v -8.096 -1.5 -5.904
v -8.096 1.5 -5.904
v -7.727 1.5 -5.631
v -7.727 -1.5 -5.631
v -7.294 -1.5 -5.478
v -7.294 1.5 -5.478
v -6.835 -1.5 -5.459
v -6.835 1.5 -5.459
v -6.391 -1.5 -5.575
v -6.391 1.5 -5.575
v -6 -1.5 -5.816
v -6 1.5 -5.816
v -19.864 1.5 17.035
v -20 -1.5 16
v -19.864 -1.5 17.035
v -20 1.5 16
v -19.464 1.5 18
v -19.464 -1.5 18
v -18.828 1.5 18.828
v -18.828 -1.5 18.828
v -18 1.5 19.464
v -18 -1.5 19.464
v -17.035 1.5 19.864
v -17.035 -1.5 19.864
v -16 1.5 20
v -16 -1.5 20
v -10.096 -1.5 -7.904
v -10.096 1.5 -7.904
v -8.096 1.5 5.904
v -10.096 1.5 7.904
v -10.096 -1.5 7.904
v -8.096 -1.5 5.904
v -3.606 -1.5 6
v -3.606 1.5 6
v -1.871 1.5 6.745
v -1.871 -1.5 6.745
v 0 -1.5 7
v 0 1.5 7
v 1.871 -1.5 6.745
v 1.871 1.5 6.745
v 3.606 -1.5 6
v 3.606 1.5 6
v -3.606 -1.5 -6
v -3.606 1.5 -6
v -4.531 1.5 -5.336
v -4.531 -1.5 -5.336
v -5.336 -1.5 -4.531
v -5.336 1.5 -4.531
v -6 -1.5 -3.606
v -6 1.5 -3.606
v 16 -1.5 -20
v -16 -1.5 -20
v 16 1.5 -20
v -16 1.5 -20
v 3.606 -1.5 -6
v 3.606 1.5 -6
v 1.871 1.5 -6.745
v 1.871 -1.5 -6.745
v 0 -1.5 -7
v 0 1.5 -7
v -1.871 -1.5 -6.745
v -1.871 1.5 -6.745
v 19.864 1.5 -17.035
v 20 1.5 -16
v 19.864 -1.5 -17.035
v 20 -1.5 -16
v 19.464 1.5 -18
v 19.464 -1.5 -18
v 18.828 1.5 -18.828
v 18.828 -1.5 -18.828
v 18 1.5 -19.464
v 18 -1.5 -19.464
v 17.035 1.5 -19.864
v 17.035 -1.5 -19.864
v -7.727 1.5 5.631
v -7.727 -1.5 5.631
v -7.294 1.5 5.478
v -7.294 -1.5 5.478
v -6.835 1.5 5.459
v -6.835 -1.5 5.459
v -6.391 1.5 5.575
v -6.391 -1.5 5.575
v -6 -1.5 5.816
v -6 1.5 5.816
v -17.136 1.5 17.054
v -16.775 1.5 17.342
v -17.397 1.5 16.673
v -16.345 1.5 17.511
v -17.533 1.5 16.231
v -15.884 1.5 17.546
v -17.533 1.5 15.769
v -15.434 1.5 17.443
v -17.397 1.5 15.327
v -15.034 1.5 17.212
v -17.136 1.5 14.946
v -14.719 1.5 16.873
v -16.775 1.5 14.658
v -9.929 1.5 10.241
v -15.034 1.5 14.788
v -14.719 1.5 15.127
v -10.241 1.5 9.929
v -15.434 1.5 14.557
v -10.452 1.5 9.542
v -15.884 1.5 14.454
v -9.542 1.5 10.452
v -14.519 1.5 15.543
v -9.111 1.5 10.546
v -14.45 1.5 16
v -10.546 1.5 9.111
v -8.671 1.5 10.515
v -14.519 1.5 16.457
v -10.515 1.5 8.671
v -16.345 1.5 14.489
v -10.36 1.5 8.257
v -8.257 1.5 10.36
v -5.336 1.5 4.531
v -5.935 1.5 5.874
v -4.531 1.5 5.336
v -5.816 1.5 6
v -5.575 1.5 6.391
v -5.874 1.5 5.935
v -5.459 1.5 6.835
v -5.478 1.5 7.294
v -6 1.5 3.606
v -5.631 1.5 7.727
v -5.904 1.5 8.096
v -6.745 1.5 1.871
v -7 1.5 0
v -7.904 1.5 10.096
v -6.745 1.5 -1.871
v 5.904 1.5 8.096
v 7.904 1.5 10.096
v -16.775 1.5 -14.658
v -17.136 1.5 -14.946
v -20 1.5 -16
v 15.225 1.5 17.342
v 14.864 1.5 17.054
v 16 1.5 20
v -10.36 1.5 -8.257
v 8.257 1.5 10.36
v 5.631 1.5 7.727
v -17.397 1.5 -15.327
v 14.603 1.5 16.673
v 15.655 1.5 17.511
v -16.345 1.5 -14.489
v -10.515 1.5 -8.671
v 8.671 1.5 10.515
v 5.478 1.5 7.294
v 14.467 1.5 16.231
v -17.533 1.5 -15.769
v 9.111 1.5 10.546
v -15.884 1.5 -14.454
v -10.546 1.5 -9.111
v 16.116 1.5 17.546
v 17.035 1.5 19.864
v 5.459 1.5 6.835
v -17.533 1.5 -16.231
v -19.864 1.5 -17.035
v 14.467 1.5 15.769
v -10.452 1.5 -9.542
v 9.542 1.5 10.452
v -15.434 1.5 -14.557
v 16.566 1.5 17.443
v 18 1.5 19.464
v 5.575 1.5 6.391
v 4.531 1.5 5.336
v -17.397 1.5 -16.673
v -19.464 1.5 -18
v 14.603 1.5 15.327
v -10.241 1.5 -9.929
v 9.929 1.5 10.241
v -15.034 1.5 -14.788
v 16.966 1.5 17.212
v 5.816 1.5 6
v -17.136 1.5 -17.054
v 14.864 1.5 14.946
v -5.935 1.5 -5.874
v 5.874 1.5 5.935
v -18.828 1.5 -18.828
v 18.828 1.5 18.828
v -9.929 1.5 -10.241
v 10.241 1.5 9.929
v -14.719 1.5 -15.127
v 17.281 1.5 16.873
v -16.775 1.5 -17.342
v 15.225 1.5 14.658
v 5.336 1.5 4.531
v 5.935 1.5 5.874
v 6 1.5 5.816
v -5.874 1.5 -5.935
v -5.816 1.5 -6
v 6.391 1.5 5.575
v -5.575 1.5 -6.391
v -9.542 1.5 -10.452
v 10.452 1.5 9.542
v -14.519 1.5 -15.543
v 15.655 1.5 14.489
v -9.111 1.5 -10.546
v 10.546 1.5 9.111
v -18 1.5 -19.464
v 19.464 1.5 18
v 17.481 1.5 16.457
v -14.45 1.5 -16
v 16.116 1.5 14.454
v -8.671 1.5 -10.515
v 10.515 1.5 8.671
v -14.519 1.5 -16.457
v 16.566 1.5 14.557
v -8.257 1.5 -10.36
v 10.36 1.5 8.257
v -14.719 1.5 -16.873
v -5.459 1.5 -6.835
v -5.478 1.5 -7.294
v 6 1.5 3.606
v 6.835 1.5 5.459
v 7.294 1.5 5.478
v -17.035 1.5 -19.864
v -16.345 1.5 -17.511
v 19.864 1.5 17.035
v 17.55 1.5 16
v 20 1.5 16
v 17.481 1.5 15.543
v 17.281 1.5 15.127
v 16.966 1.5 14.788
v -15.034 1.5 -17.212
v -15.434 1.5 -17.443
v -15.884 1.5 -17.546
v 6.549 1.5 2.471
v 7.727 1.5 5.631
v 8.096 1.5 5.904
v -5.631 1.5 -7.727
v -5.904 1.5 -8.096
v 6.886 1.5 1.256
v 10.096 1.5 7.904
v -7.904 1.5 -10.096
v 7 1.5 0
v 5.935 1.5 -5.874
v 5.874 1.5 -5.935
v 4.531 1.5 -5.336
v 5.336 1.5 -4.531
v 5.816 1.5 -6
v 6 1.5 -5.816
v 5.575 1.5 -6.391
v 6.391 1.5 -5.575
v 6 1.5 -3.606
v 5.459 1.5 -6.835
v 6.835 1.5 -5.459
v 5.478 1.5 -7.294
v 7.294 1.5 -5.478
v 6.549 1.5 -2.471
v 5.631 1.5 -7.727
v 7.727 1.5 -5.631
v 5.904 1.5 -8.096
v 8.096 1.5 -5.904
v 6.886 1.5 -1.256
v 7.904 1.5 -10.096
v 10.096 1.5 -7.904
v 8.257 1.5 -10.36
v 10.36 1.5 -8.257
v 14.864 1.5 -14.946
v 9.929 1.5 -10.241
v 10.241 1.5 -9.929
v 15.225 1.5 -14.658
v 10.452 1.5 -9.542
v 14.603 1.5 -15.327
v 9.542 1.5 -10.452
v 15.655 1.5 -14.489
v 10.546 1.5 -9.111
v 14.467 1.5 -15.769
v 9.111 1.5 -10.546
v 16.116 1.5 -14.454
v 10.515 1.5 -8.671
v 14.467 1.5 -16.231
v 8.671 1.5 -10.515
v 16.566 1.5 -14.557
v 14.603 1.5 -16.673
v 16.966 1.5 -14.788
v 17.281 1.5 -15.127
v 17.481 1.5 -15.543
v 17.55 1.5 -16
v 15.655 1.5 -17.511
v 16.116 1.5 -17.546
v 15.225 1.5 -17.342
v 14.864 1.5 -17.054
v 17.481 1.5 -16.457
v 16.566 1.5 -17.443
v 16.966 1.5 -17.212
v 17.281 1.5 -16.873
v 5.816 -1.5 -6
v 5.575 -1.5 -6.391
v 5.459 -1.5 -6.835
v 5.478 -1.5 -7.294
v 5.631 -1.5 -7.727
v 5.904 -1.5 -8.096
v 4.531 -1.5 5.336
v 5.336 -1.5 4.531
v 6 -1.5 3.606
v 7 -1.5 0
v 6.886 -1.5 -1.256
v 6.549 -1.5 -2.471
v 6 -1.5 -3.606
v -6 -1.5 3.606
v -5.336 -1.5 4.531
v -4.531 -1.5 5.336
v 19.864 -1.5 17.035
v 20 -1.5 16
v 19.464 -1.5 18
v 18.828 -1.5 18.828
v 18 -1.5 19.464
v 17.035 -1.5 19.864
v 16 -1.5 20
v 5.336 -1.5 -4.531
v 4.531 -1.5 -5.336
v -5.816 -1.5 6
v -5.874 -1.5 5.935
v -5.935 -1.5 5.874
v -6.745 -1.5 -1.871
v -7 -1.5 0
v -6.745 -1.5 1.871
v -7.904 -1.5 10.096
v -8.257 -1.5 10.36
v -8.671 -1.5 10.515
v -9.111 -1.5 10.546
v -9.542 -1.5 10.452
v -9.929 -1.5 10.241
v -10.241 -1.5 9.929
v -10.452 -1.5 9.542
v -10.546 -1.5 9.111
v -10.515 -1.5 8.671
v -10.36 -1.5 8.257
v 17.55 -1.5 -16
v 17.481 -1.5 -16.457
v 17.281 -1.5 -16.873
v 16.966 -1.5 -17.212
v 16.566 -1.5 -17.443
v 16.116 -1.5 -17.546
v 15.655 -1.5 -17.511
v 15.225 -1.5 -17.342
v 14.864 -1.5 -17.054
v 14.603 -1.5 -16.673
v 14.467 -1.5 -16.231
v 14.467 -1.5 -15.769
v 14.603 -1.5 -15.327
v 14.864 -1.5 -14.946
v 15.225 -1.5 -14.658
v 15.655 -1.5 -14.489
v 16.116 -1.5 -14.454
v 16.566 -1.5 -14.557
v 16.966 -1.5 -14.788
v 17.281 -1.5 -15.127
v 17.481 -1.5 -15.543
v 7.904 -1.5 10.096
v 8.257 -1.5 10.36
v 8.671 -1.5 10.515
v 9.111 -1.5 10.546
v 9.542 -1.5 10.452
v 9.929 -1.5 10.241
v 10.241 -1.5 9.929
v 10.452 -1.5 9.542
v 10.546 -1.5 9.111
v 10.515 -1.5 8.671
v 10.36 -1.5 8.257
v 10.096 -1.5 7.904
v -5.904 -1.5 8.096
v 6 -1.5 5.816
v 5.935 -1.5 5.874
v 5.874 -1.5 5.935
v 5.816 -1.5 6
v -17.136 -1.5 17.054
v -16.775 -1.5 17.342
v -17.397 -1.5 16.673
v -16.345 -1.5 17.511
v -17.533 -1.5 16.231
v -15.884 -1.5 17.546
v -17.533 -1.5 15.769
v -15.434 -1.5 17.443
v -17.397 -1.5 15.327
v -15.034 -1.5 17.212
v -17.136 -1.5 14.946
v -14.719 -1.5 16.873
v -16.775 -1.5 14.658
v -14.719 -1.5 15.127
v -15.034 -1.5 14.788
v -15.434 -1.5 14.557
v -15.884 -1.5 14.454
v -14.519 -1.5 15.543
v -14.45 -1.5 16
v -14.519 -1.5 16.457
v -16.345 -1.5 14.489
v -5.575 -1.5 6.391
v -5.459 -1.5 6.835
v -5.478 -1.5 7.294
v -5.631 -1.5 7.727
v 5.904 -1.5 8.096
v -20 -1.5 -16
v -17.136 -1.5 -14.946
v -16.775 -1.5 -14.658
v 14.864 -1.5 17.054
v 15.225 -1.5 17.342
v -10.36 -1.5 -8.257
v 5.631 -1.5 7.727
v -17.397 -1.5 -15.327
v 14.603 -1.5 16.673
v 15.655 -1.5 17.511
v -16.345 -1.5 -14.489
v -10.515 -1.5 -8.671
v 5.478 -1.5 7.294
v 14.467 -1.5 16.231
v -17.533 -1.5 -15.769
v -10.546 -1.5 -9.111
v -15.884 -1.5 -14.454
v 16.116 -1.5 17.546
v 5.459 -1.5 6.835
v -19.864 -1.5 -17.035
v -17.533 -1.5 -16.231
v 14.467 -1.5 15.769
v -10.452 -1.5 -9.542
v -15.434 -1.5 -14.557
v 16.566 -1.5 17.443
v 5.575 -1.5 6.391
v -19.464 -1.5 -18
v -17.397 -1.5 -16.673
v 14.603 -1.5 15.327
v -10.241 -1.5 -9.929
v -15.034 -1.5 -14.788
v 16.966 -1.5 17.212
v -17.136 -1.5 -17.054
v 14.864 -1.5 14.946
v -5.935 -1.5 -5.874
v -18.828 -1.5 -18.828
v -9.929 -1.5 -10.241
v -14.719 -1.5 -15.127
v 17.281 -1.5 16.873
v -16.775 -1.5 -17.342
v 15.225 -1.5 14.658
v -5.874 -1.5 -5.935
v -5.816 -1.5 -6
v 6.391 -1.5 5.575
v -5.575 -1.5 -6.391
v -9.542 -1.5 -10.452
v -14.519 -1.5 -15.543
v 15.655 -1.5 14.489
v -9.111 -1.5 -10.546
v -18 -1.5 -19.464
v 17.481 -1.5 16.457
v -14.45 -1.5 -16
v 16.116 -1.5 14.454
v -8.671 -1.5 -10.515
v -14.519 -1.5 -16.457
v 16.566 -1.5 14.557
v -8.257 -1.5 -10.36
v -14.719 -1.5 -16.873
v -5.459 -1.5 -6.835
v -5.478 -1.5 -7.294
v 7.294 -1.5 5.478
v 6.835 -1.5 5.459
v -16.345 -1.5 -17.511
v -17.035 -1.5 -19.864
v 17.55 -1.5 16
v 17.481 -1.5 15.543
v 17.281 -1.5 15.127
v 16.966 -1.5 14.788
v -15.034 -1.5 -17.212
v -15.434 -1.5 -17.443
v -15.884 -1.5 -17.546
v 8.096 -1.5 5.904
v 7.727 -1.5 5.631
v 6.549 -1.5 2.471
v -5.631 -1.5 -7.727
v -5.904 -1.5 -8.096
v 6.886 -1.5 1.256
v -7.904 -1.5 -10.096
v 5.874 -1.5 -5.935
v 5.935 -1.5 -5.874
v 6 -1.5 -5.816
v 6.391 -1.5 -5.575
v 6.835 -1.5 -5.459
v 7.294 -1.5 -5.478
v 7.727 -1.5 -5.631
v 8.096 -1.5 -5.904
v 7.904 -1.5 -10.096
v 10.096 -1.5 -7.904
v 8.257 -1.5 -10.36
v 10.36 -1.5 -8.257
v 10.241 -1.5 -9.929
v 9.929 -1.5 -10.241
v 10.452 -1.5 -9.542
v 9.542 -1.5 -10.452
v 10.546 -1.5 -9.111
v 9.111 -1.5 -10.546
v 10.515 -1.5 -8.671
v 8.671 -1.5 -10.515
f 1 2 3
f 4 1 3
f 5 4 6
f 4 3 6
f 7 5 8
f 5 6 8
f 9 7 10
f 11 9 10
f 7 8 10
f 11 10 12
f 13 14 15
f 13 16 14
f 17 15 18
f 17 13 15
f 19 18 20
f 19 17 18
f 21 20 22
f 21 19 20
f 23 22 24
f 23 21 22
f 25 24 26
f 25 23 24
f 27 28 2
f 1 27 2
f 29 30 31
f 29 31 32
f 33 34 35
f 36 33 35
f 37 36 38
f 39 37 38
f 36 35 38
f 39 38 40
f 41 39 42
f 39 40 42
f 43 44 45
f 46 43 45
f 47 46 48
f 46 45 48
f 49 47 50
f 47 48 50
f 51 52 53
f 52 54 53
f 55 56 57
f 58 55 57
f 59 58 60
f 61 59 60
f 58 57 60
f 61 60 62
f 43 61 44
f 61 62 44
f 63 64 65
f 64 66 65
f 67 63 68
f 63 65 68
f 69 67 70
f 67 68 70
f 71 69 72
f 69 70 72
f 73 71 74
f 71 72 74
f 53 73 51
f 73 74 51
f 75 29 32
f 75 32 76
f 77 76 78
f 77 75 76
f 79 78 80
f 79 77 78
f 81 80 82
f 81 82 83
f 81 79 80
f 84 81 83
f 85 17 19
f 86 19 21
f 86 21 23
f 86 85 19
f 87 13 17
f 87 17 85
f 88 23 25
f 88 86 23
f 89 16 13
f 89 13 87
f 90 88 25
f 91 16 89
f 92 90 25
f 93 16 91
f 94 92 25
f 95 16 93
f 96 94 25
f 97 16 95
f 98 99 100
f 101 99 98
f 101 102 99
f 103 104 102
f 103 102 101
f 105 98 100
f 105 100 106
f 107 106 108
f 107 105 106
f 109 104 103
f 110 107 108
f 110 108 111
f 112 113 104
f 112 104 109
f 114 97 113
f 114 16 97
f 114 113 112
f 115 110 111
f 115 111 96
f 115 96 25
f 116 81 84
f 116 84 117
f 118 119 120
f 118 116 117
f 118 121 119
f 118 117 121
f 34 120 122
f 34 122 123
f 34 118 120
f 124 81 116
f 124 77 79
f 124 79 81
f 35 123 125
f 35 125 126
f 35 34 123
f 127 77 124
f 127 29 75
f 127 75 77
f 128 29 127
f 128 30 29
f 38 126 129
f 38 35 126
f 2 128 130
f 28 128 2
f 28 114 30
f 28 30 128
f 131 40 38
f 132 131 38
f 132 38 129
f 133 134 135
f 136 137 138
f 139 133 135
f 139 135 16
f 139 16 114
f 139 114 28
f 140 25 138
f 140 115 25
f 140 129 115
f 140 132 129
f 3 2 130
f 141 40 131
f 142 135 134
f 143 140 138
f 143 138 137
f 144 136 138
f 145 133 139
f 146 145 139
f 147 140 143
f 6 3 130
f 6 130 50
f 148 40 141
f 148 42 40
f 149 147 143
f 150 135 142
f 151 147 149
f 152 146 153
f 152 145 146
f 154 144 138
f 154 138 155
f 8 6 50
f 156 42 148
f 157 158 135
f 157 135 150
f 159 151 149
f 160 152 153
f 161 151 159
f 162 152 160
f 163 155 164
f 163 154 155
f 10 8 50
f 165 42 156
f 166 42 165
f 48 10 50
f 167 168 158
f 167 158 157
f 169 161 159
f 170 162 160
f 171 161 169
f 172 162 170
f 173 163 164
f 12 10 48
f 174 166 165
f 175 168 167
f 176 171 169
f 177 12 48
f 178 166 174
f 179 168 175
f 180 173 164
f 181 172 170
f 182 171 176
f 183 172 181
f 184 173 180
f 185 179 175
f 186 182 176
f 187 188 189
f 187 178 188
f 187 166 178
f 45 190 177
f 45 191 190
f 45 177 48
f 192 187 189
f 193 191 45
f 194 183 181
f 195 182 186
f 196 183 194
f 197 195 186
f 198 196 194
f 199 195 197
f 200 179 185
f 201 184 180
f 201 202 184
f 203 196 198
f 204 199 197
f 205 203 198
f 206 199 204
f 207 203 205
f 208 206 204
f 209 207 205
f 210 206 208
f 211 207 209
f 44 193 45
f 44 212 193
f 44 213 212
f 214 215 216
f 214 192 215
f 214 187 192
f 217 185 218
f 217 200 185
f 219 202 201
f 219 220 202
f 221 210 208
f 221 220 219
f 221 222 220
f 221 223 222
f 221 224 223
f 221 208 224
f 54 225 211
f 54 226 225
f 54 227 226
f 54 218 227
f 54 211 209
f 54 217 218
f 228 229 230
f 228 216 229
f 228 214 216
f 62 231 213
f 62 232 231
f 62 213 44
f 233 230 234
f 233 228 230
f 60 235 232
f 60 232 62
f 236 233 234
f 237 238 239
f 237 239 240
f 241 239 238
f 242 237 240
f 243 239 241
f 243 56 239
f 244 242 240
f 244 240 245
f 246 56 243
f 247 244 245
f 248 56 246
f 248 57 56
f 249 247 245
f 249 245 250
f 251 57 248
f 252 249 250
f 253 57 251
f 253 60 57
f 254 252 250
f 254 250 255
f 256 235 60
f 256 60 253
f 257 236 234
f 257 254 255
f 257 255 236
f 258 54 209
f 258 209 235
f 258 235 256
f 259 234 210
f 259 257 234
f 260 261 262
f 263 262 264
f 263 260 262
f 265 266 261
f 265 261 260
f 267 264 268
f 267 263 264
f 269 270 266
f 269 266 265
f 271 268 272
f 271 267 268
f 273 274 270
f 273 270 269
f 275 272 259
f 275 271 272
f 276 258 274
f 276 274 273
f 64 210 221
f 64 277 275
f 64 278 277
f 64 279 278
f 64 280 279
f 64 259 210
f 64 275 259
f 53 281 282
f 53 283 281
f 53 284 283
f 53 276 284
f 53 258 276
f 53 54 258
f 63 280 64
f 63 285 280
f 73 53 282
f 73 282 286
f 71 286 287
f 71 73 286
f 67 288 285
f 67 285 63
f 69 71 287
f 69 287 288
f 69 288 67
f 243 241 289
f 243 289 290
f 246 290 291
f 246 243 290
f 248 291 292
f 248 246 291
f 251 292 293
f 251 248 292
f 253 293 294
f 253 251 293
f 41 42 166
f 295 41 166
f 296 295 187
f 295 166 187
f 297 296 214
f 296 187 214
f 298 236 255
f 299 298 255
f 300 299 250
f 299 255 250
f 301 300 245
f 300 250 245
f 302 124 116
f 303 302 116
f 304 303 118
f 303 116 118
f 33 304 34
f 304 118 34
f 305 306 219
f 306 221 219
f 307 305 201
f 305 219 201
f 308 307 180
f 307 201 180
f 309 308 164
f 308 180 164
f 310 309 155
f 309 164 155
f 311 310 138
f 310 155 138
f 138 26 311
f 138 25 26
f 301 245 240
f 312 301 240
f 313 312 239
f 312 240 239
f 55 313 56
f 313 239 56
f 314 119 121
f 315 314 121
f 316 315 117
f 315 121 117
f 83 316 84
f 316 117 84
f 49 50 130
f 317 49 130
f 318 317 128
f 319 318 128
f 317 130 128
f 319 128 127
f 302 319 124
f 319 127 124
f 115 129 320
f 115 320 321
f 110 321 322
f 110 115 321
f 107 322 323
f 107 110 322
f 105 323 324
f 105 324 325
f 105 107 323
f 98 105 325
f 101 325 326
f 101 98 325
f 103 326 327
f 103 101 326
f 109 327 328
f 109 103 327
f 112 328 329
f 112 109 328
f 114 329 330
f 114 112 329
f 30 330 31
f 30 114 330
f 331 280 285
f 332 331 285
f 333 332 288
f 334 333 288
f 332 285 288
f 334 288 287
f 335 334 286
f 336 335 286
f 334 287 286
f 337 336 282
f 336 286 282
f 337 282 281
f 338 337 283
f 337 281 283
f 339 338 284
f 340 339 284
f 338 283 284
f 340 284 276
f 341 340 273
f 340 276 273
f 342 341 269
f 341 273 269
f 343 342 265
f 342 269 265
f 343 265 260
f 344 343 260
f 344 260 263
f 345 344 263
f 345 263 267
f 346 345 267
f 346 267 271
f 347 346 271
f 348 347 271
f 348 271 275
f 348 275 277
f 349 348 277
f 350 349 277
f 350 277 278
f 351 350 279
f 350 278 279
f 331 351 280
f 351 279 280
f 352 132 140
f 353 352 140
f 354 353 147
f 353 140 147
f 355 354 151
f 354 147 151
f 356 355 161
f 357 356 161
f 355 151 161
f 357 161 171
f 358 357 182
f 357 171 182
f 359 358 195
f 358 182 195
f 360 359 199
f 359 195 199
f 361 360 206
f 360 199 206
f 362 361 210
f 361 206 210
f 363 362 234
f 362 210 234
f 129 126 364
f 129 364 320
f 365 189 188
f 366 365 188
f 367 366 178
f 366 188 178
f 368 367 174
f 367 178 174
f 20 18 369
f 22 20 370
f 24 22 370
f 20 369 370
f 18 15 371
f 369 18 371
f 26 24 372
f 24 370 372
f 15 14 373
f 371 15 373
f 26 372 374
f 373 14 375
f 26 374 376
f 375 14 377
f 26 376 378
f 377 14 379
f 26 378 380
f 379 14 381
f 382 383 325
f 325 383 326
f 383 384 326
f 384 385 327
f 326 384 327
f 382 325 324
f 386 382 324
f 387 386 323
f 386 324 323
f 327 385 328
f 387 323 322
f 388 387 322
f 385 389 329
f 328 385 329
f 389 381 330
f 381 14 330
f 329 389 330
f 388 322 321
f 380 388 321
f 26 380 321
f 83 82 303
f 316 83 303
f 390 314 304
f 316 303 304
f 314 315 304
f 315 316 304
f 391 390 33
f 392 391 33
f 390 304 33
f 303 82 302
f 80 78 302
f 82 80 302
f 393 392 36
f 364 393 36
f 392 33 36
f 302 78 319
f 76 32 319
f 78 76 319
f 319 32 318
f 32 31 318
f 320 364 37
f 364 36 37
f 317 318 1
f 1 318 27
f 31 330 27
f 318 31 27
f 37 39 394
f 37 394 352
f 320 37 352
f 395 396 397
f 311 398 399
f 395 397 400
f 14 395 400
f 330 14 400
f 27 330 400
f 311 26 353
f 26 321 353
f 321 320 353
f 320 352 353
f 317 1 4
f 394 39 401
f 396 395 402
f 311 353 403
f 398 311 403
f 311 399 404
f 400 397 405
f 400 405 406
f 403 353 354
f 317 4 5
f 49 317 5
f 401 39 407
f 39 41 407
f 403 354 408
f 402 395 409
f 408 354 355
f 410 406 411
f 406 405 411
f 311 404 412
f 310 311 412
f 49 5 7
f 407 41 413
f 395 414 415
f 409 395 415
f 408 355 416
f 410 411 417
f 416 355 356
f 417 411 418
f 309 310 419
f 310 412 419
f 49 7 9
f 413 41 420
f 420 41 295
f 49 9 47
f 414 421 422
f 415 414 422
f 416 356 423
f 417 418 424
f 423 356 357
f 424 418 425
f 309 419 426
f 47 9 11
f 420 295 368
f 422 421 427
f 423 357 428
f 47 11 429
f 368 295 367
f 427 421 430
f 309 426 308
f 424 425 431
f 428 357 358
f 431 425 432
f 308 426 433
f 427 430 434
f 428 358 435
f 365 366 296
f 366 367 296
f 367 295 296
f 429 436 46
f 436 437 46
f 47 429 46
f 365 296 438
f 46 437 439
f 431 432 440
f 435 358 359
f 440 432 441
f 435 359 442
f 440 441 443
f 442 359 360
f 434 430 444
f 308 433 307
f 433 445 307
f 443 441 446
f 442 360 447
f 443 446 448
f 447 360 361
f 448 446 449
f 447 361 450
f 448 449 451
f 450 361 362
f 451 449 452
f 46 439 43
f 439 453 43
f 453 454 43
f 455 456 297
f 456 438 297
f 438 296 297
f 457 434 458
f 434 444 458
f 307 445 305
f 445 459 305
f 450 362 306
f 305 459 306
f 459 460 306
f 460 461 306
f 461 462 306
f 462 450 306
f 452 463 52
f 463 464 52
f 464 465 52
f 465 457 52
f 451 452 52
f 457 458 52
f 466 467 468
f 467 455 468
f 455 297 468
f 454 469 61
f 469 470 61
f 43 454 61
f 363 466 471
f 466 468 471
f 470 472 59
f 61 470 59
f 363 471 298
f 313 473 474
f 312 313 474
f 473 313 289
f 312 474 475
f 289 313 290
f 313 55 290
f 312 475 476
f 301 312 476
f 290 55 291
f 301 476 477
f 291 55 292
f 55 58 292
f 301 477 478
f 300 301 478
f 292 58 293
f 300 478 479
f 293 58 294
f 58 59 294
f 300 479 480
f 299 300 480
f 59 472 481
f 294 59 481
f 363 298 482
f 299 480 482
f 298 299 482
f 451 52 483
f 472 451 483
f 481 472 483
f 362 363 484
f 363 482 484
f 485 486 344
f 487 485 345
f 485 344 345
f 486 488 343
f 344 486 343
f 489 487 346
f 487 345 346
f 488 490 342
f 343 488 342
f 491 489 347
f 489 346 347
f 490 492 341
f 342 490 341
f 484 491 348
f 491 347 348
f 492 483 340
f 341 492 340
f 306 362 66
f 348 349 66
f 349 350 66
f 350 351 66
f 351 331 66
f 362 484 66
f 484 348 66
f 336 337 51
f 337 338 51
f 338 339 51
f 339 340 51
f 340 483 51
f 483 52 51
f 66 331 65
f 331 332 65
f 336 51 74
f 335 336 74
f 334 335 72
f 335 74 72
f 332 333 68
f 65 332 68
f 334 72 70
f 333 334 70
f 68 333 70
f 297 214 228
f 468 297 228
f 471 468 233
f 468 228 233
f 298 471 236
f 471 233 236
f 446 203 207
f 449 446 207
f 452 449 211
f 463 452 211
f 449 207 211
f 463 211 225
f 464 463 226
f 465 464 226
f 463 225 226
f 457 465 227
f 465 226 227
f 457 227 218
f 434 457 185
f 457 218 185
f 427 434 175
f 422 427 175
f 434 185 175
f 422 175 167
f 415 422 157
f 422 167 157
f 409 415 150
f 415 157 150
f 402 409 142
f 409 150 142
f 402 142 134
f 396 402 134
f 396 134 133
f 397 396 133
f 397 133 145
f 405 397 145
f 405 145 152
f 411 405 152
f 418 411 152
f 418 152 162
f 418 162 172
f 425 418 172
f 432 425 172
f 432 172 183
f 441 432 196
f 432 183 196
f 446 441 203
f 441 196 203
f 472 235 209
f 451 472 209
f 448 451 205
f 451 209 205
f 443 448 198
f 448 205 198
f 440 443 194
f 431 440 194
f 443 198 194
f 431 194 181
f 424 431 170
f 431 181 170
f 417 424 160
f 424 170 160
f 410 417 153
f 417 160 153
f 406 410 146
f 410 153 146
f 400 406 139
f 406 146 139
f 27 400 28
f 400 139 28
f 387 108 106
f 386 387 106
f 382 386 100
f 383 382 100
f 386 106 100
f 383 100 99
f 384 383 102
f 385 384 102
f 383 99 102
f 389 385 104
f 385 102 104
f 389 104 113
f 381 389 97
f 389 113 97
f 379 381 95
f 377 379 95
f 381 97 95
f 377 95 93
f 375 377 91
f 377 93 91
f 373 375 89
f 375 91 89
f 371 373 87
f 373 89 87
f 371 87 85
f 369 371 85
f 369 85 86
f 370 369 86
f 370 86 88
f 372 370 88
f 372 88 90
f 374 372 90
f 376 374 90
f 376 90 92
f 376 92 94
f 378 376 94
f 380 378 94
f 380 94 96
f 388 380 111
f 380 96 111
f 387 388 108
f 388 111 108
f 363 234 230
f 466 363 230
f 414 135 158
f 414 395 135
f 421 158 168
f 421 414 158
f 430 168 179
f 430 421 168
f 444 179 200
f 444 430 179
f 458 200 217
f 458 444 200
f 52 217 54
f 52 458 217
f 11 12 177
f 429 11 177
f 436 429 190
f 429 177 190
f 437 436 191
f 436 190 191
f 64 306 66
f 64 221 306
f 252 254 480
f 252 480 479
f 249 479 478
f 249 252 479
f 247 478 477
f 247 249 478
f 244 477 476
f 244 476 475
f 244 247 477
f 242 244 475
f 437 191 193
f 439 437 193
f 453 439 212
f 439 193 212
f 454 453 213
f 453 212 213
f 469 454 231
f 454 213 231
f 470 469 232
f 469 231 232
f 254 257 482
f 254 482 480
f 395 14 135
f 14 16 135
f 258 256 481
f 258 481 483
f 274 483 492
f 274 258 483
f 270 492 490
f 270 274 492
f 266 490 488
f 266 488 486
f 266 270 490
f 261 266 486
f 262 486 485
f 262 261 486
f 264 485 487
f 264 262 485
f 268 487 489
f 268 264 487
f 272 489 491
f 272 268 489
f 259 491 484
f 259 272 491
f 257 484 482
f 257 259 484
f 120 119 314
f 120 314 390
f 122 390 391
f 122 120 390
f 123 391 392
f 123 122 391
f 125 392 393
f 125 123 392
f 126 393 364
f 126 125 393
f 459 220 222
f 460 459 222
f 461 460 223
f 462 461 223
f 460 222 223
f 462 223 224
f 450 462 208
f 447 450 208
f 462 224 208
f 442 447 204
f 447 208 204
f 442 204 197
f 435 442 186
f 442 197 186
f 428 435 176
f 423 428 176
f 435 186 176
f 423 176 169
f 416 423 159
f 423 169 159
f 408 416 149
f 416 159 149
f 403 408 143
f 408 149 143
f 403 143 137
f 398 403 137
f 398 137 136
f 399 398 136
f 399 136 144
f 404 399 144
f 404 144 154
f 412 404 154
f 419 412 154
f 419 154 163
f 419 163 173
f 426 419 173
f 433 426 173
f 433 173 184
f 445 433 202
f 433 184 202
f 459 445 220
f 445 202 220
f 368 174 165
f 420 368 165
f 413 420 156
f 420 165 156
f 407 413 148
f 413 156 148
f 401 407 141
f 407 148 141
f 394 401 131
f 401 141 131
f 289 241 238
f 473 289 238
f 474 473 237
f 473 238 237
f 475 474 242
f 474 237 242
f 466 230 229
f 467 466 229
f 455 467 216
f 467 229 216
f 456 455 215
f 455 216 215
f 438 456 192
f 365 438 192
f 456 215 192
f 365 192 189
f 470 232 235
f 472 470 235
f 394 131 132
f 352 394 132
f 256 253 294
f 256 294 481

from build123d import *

# Parameters (mm, degrees)
SKETCH1_W           = 40
SKETCH1_H           = 40
BOSS_EXTRUDE1_DEPTH = 1.5
FILLET1_R           = 4
SKETCH3_R           = 7
SKETCH3_R_2         = 1.55
CUT_EXTRUDE2_DEPTH  = 3


with BuildPart() as part:
    # Sketch1 → Boss-Extrude1 (new body, symmetric)
    with BuildSketch(Plane(origin=(0, 0, 0), x_dir=(1, 0, 0), z_dir=(0, 1, 0))):
        Rectangle(SKETCH1_W, SKETCH1_H)
    extrude(amount=BOSS_EXTRUDE1_DEPTH, both=True)

    # Fillet1
    fillet1_edges = [part.edges().sort_by_distance(p)[0] for p in [
        (20, 0, 20),
        (-20, 0, 20),
        (-20, 0, -20),
        (20, 0, -20),
    ]]
    fillet(fillet1_edges, radius=FILLET1_R)

    # Sketch3 → Cut-Extrude2 (cut)
    with BuildSketch(Plane(origin=(0, 1.5, 0), x_dir=(1, 0, 0), z_dir=(0, 1, 0))):
        Circle(SKETCH3_R)
        with BuildLine():
            Line((5.903984489, -8.096015511), (7.903984489, -10.096015511))
            ThreePointArc((7.903984489, -10.096015511), (10.096015511, -10.096015511), (10.096015511, -7.903984489))
            Line((10.096015511, -7.903984489), (8.096015511, -5.903984489))
            ThreePointArc((8.096015511, -5.903984489), (5.903984489, -5.903984489), (5.903984489, -8.096015511))
        make_face()
        with Locations((16, -16)):
            Circle(SKETCH3_R_2)
        with BuildLine():
            ThreePointArc((-7.903984489, -10.096015511), (-10.096015511, -10.096015511), (-10.096015511, -7.903984489))
            Line((-10.096015511, -7.903984489), (-8.096015511, -5.903984489))
            ThreePointArc((-8.096015511, -5.903984489), (-5.903984489, -5.903984489), (-5.903984489, -8.096015511))
            Line((-5.903984489, -8.096015511), (-7.903984489, -10.096015511))
        make_face()
        with BuildLine():
            Line((-5.903984489, 8.096015511), (-7.903984489, 10.096015511))
            ThreePointArc((-7.903984489, 10.096015511), (-10.096015511, 10.096015511), (-10.096015511, 7.903984489))
            Line((-10.096015511, 7.903984489), (-8.096015511, 5.903984489))
            ThreePointArc((-8.096015511, 5.903984489), (-5.903984489, 5.903984489), (-5.903984489, 8.096015511))
        make_face()
        with Locations((-16, 16)):
            Circle(SKETCH3_R_2)
        with BuildLine():
            ThreePointArc((7.903984489, 10.096015511), (10.096015511, 10.096015511), (10.096015511, 7.903984489))
            Line((10.096015511, 7.903984489), (8.096015511, 5.903984489))
            ThreePointArc((8.096015511, 5.903984489), (5.903984489, 5.903984489), (5.903984489, 8.096015511))
            Line((5.903984489, 8.096015511), (7.903984489, 10.096015511))
        make_face()
        with Locations((16, 16)):
            Circle(SKETCH3_R_2)
        with Locations((-16, -16)):
            Circle(SKETCH3_R_2)
        with BuildLine():
            ThreePointArc((-6, 5.815728072), (-5.903984489, 5.903984489), (-5.815728072, 6))
            Line((-5.815728072, 6), (-6, 6))
            Line((-6, 6), (-6, 5.815728072))
        make_face()
        with BuildLine():
            Line((-6, -6), (-5.815728072, -6))
            ThreePointArc((-5.815728072, -6), (-5.903984489, -5.903984489), (-6, -5.815728072))
            Line((-6, -5.815728072), (-6, -6))
        make_face()
        with BuildLine():
            Line((6, -6), (6, -5.815728072))
            ThreePointArc((6, -5.815728072), (5.903984489, -5.903984489), (5.815728072, -6))
            Line((5.815728072, -6), (6, -6))
        make_face()
        with BuildLine():
            ThreePointArc((5.815728072, 6), (5.903984489, 5.903984489), (6, 5.815728072))
            Line((6, 5.815728072), (6, 6))
            Line((6, 6), (5.815728072, 6))
        make_face()
        with BuildLine():
            ThreePointArc((-6, 3.605551275), (-7, 0), (-6, -3.605551275))
            Line((-6, -3.605551275), (-6, 3.605551275))
        make_face()
        with BuildLine():
            Line((-3.605551275, 6), (3.605551275, 6))
            ThreePointArc((3.605551275, 6), (0, 7), (-3.605551275, 6))
        make_face()
        with BuildLine():
            Line((6, 3.605551275), (6, -3.605551275))
            ThreePointArc((6, -3.605551275), (6.745368782, -1.870828693), (7, 0))
            ThreePointArc((7, 0), (6.745368782, 1.870828693), (6, 3.605551275))
        make_face()
        with BuildLine():
            ThreePointArc((-3.605551275, -6), (0, -7), (3.605551275, -6))
            Line((3.605551275, -6), (-3.605551275, -6))
        make_face()
    extrude(amount=-CUT_EXTRUDE2_DEPTH, mode=Mode.SUBTRACT)


solid = part.part
